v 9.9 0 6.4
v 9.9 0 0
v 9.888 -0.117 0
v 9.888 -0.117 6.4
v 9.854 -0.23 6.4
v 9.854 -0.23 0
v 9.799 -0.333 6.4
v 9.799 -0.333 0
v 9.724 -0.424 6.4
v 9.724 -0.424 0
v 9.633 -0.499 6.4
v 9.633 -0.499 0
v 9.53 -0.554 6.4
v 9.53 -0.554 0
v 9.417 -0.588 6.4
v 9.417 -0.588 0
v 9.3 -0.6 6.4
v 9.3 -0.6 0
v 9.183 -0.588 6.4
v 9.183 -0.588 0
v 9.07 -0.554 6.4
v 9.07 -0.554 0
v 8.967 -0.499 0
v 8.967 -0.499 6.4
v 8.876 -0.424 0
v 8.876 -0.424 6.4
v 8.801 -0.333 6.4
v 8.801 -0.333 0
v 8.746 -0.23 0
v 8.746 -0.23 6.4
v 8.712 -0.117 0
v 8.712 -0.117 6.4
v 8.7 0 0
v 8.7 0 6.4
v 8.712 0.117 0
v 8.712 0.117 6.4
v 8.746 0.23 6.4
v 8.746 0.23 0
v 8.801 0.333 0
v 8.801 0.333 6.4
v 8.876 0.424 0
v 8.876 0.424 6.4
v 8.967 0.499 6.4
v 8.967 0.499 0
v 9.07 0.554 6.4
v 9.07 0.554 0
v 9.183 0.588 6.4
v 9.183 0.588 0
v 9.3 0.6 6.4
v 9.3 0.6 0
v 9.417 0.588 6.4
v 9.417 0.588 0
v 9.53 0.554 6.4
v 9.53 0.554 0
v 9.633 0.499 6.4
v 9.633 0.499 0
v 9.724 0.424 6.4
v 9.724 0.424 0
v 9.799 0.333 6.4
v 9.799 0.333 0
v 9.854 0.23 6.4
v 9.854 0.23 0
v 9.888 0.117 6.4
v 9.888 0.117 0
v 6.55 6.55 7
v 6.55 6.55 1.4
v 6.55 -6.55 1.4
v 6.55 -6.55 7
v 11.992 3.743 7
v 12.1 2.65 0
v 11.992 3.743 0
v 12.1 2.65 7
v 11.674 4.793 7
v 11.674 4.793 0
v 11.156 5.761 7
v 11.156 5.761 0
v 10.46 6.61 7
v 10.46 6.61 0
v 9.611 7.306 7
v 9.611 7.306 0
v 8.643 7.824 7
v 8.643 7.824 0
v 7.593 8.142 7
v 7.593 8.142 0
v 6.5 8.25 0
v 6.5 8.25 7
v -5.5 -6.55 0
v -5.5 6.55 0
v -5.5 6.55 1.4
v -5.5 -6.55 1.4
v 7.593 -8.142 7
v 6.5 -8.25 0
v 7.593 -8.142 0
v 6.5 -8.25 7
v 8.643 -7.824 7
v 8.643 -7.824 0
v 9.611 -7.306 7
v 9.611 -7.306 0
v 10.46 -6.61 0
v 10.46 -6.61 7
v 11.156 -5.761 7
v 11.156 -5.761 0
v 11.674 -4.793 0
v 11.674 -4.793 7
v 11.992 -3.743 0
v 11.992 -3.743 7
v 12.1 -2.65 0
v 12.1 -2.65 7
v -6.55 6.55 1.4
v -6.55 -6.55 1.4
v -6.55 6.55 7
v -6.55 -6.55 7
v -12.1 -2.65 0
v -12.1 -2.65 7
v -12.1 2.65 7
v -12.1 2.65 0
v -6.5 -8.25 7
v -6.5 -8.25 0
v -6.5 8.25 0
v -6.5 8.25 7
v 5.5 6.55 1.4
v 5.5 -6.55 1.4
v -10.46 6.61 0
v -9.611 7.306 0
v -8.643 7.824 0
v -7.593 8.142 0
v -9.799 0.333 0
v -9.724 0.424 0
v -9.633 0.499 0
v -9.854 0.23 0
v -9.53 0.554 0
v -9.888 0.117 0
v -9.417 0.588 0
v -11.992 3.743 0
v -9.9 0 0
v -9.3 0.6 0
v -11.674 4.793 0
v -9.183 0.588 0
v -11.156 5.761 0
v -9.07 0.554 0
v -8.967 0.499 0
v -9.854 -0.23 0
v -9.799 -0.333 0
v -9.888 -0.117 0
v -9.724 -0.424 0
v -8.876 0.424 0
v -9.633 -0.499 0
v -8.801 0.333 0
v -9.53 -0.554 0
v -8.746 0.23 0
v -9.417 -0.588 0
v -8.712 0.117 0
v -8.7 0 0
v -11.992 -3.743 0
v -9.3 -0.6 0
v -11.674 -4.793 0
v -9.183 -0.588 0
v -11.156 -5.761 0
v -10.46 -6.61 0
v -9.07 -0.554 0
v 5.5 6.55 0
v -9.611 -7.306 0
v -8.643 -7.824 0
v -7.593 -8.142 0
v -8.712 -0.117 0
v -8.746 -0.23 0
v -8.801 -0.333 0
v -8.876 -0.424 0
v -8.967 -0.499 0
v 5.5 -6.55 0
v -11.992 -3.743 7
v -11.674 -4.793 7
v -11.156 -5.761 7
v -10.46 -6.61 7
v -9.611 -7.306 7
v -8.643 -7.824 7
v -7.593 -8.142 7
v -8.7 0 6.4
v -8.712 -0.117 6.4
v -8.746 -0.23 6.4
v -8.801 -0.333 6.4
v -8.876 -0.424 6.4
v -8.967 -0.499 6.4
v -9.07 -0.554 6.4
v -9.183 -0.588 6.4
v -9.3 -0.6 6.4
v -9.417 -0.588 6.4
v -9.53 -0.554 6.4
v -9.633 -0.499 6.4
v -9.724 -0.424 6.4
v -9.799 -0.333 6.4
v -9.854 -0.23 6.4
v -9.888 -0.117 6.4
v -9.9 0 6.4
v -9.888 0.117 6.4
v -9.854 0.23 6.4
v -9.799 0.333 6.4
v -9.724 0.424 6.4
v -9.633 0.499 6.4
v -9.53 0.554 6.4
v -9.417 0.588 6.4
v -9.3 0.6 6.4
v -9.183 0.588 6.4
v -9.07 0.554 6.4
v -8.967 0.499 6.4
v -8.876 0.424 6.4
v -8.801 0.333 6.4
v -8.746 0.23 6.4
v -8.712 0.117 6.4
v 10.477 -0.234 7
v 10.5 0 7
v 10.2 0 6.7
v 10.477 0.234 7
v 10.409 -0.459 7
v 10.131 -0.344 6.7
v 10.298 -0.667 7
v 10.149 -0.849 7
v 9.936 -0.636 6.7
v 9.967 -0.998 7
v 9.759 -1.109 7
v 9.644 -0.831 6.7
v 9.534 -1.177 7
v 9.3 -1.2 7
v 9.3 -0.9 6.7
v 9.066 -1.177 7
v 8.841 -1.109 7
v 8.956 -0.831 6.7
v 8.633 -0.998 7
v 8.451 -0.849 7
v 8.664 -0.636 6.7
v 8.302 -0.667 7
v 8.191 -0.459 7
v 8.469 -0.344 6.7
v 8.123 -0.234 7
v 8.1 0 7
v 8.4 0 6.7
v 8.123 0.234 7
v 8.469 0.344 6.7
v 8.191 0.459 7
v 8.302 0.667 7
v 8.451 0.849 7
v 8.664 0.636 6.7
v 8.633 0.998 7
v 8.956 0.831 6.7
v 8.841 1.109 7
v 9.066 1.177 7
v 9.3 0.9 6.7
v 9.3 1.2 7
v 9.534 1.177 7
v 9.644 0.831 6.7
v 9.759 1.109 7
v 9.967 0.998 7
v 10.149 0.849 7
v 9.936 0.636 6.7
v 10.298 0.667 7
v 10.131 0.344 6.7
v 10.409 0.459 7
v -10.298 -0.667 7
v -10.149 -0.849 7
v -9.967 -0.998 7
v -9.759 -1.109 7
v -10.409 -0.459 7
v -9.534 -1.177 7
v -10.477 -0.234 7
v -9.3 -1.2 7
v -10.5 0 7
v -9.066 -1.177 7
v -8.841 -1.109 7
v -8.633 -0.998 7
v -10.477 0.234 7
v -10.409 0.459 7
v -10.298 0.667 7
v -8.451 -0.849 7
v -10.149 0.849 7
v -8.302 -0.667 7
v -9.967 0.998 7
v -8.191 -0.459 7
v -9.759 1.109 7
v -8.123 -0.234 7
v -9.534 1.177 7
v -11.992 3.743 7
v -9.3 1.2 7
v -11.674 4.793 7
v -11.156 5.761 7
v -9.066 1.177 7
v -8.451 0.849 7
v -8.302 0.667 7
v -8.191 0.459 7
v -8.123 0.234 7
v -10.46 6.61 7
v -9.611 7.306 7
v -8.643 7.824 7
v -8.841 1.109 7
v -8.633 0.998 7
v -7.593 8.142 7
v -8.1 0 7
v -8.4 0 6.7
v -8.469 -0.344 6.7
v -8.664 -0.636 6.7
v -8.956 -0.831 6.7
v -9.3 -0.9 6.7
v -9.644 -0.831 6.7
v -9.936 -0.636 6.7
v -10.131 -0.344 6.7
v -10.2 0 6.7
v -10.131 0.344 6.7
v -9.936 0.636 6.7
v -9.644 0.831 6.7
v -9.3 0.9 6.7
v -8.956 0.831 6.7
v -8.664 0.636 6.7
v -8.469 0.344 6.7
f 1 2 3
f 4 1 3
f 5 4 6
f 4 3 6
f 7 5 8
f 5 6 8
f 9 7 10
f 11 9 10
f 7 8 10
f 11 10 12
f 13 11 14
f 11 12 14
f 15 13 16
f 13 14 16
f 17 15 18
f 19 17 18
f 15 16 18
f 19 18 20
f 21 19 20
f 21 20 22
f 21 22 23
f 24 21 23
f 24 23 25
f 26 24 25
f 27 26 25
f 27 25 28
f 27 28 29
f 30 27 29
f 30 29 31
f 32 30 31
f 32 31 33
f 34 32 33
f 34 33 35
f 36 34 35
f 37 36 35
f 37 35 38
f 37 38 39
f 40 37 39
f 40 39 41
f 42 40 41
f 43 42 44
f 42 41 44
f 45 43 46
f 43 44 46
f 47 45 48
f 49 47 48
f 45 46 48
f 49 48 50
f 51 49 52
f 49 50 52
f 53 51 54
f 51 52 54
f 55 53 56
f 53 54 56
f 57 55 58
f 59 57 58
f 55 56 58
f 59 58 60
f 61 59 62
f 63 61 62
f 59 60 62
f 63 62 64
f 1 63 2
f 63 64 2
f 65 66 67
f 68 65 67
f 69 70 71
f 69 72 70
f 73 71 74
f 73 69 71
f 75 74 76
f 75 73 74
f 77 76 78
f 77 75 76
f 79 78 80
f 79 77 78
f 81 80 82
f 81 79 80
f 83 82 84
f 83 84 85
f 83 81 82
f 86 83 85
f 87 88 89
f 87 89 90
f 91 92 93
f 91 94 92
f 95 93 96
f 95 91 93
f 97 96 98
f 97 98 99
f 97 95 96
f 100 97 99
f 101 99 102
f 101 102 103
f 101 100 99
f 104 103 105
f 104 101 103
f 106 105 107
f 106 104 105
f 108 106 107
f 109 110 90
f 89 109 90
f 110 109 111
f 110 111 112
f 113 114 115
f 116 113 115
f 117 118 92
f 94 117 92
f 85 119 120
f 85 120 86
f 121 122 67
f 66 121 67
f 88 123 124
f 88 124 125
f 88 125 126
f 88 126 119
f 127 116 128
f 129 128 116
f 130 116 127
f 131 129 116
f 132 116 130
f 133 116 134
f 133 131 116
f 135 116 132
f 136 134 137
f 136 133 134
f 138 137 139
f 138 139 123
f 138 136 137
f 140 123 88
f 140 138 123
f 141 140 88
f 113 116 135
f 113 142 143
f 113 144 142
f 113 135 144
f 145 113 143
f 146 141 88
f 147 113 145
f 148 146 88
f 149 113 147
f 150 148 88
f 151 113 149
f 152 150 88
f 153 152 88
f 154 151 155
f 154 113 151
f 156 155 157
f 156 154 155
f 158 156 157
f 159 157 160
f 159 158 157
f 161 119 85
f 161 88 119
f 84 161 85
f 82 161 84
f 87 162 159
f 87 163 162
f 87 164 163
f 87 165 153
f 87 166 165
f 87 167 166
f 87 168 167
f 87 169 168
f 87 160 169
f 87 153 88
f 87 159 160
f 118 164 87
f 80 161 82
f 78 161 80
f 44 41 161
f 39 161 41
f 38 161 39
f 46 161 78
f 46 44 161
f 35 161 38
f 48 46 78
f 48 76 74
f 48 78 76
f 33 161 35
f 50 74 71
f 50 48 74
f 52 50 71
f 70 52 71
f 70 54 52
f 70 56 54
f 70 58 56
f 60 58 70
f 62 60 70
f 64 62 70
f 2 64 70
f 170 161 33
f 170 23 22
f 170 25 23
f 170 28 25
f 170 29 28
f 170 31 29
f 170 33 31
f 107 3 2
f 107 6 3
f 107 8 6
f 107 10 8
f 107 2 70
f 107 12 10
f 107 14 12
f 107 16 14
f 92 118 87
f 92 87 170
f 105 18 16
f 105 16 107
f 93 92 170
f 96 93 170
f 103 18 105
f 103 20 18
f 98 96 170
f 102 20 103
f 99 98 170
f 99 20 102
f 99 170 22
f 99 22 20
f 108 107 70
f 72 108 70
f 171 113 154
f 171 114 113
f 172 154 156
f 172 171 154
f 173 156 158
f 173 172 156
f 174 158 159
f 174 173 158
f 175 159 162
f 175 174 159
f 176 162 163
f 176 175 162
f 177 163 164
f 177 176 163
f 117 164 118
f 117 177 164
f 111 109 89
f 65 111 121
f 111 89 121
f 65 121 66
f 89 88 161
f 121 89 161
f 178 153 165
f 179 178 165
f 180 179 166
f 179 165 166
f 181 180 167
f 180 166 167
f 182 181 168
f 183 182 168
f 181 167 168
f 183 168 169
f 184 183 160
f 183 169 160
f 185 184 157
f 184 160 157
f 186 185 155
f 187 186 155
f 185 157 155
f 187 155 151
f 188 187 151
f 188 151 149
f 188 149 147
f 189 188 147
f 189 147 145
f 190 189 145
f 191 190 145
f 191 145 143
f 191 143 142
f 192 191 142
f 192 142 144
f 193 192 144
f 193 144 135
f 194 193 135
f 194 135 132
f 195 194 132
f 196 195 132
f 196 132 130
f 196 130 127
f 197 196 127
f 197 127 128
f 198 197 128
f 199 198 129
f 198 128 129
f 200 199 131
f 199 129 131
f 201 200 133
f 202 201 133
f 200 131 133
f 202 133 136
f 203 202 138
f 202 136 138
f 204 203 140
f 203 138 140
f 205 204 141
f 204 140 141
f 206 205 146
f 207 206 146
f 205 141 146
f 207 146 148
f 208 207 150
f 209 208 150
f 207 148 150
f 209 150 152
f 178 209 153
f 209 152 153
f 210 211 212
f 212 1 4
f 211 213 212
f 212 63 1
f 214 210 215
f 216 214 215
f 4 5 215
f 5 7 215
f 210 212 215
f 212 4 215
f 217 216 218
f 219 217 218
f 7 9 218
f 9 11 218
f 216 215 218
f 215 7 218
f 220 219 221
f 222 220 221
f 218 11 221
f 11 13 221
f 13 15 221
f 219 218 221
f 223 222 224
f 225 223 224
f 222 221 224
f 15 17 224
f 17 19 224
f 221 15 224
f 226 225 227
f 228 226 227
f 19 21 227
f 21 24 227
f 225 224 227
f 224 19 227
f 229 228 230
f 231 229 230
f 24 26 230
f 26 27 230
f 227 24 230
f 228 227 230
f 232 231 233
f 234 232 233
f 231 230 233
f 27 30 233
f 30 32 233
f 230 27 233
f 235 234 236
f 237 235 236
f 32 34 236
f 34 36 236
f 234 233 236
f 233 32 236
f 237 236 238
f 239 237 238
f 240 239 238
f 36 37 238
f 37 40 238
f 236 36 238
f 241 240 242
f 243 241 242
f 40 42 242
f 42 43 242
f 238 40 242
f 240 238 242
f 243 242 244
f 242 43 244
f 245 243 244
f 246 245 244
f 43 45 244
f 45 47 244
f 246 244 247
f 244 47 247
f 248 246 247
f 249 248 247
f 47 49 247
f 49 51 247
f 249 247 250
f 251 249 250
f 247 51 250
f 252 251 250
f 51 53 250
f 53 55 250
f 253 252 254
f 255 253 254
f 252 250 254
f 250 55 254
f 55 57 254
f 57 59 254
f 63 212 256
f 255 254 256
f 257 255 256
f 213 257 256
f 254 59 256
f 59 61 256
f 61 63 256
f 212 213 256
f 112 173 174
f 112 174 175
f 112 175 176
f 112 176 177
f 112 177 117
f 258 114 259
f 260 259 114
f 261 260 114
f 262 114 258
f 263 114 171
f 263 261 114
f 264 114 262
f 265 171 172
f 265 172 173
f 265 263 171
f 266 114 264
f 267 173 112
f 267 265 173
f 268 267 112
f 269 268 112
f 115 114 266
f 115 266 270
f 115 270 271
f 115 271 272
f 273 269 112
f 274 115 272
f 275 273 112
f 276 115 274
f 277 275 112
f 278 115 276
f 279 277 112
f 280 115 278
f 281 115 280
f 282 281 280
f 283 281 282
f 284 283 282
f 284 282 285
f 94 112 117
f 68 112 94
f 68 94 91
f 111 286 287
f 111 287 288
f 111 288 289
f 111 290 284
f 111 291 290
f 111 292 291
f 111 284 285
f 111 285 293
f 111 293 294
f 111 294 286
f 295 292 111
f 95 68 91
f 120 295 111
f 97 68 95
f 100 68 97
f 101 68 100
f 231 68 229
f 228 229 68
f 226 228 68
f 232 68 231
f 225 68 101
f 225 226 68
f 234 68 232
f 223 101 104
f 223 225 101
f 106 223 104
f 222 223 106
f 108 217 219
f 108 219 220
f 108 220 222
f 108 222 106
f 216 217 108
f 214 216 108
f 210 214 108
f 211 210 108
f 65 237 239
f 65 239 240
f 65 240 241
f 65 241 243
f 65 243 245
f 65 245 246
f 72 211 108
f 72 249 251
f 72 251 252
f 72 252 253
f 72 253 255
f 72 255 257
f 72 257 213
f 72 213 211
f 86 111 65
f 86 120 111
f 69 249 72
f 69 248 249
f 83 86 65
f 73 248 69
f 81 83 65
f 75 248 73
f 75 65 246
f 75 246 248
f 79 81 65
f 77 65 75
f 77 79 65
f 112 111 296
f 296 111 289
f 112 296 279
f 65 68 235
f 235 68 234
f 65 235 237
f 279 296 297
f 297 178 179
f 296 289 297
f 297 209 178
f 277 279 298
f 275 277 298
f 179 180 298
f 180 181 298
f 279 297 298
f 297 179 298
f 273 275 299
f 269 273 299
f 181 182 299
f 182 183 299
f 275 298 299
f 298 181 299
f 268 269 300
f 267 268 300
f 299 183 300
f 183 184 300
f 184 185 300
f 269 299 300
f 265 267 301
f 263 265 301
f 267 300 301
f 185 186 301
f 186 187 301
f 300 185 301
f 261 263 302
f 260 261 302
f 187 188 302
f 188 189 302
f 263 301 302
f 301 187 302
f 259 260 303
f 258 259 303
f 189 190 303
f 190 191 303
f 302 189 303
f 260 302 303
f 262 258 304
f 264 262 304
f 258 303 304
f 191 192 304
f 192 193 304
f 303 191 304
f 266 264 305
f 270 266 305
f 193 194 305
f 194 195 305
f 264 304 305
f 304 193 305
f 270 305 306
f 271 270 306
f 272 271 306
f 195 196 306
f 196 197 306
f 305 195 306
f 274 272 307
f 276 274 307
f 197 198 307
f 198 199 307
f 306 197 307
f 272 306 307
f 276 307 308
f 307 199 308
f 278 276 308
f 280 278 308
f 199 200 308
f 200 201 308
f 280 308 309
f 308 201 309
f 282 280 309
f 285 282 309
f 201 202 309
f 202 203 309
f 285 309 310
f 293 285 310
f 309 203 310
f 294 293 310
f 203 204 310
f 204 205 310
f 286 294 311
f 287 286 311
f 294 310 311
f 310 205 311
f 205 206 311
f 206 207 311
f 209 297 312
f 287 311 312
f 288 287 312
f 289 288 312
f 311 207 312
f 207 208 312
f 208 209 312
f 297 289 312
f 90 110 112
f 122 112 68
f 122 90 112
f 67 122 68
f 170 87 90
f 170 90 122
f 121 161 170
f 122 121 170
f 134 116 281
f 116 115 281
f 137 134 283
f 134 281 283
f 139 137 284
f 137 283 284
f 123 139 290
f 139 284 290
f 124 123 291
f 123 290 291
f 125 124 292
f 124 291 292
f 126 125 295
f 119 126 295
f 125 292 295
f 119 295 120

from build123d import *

# Parameters (mm, degrees)
F0_W     = 24.2
F0_H     = 16.5
F1_DEPTH = 7
F2_R     = 5.6
F3_W     = 13.1
F3_H     = 13.1
F4_DEPTH = 7.001
F5_W     = 1.05
F5_H     = 13.1
F6_DEPTH = 1.4
F7_R     = 0.6
F8_DEPTH = 7.001
F9_SIZE  = 0.6


with BuildPart() as f1:
    # F0 (on Top) → F1 (new body)
    with BuildSketch(Plane.XY):
        Rectangle(F0_W, F0_H)
    extrude(amount=F1_DEPTH)

    # F2
    f2_edges = [f1.edges().sort_by_distance(p)[0] for p in [
        (-12.1, -8.25, 3.5),
        (12.1, -8.25, 3.5),
        (12.1, 8.25, 3.5),
        (-12.1, 8.25, 3.5),
    ]]
    fillet(f2_edges, radius=F2_R)

    # F3 (on face) → F4 (cut, through all)
    with BuildSketch(Plane(origin=(0, 0, 0), x_dir=(1, 0, 0), z_dir=(0, 0, -1))):
        Rectangle(F3_W, F3_H)
    extrude(amount=-F4_DEPTH, mode=Mode.SUBTRACT)

    # F5 (on face) → F6 (join)
    with BuildSketch(Plane(origin=(0, 0, 0), x_dir=(1, 0, 0), z_dir=(0, 0, -1))):
        with Locations((-6.025, 0)):
            Rectangle(F5_W, F5_H)
        with Locations((6.025, 0)):
            Rectangle(F5_W, F5_H)
    extrude(amount=-F6_DEPTH)

    # F7 (on face) → F8 (cut, through all)
    with BuildSketch(Plane(origin=(0, 0, 0), x_dir=(1, 0, 0), z_dir=(0, 0, -1))):
        with Locations((-9.3, 0)):
            Circle(F7_R)
        with Locations((9.3, 0)):
            Circle(F7_R)
    extrude(amount=-F8_DEPTH, mode=Mode.SUBTRACT)

    # F9
    f9_edges = [f1.edges().sort_by_distance(p)[0] for p in [
        (8.7, 0, 7),
        (-9.9, 0, 7),
    ]]
    chamfer(f9_edges, length=F9_SIZE)


solid = f1.part
